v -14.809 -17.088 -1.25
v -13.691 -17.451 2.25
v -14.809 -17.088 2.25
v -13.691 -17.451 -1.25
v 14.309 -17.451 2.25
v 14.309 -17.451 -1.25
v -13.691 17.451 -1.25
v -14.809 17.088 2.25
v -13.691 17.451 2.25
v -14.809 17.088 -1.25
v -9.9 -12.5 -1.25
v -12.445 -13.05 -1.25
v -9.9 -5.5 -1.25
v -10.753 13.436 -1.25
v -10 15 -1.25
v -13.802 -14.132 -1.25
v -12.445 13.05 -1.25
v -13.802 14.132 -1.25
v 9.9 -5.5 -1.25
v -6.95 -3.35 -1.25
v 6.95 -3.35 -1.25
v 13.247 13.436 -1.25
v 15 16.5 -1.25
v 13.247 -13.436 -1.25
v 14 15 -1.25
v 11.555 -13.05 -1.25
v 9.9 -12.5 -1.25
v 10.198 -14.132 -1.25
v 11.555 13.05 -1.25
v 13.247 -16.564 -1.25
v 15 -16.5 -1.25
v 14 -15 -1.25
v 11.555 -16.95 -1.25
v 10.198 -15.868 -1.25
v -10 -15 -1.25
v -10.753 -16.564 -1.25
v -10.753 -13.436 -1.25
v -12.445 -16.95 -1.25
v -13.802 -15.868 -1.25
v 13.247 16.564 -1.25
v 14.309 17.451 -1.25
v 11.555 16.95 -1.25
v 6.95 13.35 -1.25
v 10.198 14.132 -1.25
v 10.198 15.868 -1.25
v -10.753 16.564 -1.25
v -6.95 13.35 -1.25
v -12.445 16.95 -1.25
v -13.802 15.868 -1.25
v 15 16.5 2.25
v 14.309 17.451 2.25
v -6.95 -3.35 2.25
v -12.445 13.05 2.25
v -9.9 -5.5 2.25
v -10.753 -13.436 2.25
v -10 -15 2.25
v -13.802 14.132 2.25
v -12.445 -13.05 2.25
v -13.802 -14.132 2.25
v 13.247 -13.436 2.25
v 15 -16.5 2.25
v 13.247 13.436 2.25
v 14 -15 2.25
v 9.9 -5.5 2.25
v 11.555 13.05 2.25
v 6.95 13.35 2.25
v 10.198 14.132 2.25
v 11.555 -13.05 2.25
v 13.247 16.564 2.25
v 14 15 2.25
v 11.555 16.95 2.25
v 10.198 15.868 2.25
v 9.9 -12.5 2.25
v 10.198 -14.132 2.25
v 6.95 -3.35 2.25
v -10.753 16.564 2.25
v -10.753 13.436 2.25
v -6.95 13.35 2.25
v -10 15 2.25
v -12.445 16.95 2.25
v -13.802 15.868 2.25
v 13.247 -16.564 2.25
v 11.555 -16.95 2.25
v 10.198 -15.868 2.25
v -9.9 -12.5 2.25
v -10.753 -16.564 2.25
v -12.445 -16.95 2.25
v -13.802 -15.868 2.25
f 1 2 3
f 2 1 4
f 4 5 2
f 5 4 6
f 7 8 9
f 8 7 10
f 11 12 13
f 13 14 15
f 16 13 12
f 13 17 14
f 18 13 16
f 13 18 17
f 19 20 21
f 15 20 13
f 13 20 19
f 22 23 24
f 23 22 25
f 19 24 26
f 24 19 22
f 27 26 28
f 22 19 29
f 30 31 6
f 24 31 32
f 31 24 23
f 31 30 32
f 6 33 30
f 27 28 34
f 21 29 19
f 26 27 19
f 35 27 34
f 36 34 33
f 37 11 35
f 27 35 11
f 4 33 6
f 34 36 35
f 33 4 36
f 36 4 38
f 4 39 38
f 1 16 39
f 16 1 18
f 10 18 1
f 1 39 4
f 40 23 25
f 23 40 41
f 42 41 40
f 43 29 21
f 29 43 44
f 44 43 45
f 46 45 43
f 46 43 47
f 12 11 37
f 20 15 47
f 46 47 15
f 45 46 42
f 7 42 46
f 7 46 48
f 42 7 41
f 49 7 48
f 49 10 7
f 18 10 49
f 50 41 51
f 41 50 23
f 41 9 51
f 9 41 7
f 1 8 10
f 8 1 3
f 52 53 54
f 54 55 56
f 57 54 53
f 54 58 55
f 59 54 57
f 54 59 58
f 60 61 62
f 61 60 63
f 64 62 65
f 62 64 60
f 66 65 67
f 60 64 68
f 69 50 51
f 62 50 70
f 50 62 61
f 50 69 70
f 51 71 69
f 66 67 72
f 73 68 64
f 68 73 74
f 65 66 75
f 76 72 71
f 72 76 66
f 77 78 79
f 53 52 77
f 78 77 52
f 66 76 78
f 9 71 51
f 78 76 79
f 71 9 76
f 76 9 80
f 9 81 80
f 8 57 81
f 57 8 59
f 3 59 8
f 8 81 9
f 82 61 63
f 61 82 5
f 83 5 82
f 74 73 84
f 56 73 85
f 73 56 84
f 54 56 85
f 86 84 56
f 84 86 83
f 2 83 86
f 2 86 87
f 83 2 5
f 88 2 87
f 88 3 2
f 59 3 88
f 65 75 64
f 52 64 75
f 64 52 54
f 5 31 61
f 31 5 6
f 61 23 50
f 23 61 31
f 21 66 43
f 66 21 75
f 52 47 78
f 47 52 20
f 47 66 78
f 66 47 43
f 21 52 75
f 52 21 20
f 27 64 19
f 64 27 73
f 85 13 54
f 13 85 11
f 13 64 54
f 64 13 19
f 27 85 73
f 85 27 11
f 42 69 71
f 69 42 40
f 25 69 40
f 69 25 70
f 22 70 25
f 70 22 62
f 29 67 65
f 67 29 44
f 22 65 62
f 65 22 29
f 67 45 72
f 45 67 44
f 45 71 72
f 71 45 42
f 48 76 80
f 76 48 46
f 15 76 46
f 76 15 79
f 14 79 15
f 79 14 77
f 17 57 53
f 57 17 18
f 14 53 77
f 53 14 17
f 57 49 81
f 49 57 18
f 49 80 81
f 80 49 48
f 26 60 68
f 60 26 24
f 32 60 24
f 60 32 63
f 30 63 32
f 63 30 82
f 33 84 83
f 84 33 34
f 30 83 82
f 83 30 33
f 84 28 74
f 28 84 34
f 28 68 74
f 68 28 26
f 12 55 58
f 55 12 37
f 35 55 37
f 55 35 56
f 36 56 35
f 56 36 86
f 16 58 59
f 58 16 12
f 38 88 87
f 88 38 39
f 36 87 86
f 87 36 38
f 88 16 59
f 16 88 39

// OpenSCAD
//mount for TGM336h

// board:   13.60 x 16.40
// antenna: 18.80mm x 6.00 mm x 6.40 mm(thick)/4.70

BASE  = [30.00, 35.00, 4.50];
ATGM  = [13.90, 16.70, 2.0];
ANT   = [19.80,  7.00, 4.7];
Mount = [12.0, 15.0, 2.0]; 

difference() {
    // Bracket
    union() {
        roundedcube_corners(size = BASE, center = true, radius = 1.0);
        // Pins
//        translate([11,0,+2]) cylinder(h=3, r=1.5, center = true);
//        translate([-11,0,+2]) cylinder(h=3, r=1.5, center = true);
    }
    //ATGM
    translate([0, 5, 0]) union() {
        cube(size = ATGM+[0,0,5], center = true);
//        translate([0,0,+2])
//        cube(size = ATGM + [0,0,1], center = true);
    }
    //Antenna
    translate([0, -9, 0]) union() {
        cube(size = ANT, center = true);
    }
    //Mount Holes
    translate([Mount[0],Mount[1],0]) cylinder(h=5, r=Mount[2], center = true);
    translate([-Mount[0],Mount[1],0]) cylinder(h=5, r=Mount[2], center = true);
    translate([Mount[0],-Mount[1],0]) cylinder(h=5, r=Mount[2], center = true);
    translate([-Mount[0],-Mount[1],0]) cylinder(h=5, r=Mount[2], center = true);
}

module roundedcube_corners(size = [1, 1, 1], center = false, radius = 0.5) {
    // If single value, convert to [x, y, z] vector
    size = (size[0] == undef) ? [size, size, size] : size;

    translate = (center == false) ?
        [radius, radius, radius] :
        [
            radius - (size[0] / 2),
            radius - (size[1] / 2),
            radius - (size[2] / 2)
    ];

    translate(v = translate)
    minkowski() {
        cube(size = [
            size[0] - (radius * 2),
            size[1] - (radius * 2),
            size[2] - (radius * 2)
        ]);
        cylinder(r = radius);
    }
}
